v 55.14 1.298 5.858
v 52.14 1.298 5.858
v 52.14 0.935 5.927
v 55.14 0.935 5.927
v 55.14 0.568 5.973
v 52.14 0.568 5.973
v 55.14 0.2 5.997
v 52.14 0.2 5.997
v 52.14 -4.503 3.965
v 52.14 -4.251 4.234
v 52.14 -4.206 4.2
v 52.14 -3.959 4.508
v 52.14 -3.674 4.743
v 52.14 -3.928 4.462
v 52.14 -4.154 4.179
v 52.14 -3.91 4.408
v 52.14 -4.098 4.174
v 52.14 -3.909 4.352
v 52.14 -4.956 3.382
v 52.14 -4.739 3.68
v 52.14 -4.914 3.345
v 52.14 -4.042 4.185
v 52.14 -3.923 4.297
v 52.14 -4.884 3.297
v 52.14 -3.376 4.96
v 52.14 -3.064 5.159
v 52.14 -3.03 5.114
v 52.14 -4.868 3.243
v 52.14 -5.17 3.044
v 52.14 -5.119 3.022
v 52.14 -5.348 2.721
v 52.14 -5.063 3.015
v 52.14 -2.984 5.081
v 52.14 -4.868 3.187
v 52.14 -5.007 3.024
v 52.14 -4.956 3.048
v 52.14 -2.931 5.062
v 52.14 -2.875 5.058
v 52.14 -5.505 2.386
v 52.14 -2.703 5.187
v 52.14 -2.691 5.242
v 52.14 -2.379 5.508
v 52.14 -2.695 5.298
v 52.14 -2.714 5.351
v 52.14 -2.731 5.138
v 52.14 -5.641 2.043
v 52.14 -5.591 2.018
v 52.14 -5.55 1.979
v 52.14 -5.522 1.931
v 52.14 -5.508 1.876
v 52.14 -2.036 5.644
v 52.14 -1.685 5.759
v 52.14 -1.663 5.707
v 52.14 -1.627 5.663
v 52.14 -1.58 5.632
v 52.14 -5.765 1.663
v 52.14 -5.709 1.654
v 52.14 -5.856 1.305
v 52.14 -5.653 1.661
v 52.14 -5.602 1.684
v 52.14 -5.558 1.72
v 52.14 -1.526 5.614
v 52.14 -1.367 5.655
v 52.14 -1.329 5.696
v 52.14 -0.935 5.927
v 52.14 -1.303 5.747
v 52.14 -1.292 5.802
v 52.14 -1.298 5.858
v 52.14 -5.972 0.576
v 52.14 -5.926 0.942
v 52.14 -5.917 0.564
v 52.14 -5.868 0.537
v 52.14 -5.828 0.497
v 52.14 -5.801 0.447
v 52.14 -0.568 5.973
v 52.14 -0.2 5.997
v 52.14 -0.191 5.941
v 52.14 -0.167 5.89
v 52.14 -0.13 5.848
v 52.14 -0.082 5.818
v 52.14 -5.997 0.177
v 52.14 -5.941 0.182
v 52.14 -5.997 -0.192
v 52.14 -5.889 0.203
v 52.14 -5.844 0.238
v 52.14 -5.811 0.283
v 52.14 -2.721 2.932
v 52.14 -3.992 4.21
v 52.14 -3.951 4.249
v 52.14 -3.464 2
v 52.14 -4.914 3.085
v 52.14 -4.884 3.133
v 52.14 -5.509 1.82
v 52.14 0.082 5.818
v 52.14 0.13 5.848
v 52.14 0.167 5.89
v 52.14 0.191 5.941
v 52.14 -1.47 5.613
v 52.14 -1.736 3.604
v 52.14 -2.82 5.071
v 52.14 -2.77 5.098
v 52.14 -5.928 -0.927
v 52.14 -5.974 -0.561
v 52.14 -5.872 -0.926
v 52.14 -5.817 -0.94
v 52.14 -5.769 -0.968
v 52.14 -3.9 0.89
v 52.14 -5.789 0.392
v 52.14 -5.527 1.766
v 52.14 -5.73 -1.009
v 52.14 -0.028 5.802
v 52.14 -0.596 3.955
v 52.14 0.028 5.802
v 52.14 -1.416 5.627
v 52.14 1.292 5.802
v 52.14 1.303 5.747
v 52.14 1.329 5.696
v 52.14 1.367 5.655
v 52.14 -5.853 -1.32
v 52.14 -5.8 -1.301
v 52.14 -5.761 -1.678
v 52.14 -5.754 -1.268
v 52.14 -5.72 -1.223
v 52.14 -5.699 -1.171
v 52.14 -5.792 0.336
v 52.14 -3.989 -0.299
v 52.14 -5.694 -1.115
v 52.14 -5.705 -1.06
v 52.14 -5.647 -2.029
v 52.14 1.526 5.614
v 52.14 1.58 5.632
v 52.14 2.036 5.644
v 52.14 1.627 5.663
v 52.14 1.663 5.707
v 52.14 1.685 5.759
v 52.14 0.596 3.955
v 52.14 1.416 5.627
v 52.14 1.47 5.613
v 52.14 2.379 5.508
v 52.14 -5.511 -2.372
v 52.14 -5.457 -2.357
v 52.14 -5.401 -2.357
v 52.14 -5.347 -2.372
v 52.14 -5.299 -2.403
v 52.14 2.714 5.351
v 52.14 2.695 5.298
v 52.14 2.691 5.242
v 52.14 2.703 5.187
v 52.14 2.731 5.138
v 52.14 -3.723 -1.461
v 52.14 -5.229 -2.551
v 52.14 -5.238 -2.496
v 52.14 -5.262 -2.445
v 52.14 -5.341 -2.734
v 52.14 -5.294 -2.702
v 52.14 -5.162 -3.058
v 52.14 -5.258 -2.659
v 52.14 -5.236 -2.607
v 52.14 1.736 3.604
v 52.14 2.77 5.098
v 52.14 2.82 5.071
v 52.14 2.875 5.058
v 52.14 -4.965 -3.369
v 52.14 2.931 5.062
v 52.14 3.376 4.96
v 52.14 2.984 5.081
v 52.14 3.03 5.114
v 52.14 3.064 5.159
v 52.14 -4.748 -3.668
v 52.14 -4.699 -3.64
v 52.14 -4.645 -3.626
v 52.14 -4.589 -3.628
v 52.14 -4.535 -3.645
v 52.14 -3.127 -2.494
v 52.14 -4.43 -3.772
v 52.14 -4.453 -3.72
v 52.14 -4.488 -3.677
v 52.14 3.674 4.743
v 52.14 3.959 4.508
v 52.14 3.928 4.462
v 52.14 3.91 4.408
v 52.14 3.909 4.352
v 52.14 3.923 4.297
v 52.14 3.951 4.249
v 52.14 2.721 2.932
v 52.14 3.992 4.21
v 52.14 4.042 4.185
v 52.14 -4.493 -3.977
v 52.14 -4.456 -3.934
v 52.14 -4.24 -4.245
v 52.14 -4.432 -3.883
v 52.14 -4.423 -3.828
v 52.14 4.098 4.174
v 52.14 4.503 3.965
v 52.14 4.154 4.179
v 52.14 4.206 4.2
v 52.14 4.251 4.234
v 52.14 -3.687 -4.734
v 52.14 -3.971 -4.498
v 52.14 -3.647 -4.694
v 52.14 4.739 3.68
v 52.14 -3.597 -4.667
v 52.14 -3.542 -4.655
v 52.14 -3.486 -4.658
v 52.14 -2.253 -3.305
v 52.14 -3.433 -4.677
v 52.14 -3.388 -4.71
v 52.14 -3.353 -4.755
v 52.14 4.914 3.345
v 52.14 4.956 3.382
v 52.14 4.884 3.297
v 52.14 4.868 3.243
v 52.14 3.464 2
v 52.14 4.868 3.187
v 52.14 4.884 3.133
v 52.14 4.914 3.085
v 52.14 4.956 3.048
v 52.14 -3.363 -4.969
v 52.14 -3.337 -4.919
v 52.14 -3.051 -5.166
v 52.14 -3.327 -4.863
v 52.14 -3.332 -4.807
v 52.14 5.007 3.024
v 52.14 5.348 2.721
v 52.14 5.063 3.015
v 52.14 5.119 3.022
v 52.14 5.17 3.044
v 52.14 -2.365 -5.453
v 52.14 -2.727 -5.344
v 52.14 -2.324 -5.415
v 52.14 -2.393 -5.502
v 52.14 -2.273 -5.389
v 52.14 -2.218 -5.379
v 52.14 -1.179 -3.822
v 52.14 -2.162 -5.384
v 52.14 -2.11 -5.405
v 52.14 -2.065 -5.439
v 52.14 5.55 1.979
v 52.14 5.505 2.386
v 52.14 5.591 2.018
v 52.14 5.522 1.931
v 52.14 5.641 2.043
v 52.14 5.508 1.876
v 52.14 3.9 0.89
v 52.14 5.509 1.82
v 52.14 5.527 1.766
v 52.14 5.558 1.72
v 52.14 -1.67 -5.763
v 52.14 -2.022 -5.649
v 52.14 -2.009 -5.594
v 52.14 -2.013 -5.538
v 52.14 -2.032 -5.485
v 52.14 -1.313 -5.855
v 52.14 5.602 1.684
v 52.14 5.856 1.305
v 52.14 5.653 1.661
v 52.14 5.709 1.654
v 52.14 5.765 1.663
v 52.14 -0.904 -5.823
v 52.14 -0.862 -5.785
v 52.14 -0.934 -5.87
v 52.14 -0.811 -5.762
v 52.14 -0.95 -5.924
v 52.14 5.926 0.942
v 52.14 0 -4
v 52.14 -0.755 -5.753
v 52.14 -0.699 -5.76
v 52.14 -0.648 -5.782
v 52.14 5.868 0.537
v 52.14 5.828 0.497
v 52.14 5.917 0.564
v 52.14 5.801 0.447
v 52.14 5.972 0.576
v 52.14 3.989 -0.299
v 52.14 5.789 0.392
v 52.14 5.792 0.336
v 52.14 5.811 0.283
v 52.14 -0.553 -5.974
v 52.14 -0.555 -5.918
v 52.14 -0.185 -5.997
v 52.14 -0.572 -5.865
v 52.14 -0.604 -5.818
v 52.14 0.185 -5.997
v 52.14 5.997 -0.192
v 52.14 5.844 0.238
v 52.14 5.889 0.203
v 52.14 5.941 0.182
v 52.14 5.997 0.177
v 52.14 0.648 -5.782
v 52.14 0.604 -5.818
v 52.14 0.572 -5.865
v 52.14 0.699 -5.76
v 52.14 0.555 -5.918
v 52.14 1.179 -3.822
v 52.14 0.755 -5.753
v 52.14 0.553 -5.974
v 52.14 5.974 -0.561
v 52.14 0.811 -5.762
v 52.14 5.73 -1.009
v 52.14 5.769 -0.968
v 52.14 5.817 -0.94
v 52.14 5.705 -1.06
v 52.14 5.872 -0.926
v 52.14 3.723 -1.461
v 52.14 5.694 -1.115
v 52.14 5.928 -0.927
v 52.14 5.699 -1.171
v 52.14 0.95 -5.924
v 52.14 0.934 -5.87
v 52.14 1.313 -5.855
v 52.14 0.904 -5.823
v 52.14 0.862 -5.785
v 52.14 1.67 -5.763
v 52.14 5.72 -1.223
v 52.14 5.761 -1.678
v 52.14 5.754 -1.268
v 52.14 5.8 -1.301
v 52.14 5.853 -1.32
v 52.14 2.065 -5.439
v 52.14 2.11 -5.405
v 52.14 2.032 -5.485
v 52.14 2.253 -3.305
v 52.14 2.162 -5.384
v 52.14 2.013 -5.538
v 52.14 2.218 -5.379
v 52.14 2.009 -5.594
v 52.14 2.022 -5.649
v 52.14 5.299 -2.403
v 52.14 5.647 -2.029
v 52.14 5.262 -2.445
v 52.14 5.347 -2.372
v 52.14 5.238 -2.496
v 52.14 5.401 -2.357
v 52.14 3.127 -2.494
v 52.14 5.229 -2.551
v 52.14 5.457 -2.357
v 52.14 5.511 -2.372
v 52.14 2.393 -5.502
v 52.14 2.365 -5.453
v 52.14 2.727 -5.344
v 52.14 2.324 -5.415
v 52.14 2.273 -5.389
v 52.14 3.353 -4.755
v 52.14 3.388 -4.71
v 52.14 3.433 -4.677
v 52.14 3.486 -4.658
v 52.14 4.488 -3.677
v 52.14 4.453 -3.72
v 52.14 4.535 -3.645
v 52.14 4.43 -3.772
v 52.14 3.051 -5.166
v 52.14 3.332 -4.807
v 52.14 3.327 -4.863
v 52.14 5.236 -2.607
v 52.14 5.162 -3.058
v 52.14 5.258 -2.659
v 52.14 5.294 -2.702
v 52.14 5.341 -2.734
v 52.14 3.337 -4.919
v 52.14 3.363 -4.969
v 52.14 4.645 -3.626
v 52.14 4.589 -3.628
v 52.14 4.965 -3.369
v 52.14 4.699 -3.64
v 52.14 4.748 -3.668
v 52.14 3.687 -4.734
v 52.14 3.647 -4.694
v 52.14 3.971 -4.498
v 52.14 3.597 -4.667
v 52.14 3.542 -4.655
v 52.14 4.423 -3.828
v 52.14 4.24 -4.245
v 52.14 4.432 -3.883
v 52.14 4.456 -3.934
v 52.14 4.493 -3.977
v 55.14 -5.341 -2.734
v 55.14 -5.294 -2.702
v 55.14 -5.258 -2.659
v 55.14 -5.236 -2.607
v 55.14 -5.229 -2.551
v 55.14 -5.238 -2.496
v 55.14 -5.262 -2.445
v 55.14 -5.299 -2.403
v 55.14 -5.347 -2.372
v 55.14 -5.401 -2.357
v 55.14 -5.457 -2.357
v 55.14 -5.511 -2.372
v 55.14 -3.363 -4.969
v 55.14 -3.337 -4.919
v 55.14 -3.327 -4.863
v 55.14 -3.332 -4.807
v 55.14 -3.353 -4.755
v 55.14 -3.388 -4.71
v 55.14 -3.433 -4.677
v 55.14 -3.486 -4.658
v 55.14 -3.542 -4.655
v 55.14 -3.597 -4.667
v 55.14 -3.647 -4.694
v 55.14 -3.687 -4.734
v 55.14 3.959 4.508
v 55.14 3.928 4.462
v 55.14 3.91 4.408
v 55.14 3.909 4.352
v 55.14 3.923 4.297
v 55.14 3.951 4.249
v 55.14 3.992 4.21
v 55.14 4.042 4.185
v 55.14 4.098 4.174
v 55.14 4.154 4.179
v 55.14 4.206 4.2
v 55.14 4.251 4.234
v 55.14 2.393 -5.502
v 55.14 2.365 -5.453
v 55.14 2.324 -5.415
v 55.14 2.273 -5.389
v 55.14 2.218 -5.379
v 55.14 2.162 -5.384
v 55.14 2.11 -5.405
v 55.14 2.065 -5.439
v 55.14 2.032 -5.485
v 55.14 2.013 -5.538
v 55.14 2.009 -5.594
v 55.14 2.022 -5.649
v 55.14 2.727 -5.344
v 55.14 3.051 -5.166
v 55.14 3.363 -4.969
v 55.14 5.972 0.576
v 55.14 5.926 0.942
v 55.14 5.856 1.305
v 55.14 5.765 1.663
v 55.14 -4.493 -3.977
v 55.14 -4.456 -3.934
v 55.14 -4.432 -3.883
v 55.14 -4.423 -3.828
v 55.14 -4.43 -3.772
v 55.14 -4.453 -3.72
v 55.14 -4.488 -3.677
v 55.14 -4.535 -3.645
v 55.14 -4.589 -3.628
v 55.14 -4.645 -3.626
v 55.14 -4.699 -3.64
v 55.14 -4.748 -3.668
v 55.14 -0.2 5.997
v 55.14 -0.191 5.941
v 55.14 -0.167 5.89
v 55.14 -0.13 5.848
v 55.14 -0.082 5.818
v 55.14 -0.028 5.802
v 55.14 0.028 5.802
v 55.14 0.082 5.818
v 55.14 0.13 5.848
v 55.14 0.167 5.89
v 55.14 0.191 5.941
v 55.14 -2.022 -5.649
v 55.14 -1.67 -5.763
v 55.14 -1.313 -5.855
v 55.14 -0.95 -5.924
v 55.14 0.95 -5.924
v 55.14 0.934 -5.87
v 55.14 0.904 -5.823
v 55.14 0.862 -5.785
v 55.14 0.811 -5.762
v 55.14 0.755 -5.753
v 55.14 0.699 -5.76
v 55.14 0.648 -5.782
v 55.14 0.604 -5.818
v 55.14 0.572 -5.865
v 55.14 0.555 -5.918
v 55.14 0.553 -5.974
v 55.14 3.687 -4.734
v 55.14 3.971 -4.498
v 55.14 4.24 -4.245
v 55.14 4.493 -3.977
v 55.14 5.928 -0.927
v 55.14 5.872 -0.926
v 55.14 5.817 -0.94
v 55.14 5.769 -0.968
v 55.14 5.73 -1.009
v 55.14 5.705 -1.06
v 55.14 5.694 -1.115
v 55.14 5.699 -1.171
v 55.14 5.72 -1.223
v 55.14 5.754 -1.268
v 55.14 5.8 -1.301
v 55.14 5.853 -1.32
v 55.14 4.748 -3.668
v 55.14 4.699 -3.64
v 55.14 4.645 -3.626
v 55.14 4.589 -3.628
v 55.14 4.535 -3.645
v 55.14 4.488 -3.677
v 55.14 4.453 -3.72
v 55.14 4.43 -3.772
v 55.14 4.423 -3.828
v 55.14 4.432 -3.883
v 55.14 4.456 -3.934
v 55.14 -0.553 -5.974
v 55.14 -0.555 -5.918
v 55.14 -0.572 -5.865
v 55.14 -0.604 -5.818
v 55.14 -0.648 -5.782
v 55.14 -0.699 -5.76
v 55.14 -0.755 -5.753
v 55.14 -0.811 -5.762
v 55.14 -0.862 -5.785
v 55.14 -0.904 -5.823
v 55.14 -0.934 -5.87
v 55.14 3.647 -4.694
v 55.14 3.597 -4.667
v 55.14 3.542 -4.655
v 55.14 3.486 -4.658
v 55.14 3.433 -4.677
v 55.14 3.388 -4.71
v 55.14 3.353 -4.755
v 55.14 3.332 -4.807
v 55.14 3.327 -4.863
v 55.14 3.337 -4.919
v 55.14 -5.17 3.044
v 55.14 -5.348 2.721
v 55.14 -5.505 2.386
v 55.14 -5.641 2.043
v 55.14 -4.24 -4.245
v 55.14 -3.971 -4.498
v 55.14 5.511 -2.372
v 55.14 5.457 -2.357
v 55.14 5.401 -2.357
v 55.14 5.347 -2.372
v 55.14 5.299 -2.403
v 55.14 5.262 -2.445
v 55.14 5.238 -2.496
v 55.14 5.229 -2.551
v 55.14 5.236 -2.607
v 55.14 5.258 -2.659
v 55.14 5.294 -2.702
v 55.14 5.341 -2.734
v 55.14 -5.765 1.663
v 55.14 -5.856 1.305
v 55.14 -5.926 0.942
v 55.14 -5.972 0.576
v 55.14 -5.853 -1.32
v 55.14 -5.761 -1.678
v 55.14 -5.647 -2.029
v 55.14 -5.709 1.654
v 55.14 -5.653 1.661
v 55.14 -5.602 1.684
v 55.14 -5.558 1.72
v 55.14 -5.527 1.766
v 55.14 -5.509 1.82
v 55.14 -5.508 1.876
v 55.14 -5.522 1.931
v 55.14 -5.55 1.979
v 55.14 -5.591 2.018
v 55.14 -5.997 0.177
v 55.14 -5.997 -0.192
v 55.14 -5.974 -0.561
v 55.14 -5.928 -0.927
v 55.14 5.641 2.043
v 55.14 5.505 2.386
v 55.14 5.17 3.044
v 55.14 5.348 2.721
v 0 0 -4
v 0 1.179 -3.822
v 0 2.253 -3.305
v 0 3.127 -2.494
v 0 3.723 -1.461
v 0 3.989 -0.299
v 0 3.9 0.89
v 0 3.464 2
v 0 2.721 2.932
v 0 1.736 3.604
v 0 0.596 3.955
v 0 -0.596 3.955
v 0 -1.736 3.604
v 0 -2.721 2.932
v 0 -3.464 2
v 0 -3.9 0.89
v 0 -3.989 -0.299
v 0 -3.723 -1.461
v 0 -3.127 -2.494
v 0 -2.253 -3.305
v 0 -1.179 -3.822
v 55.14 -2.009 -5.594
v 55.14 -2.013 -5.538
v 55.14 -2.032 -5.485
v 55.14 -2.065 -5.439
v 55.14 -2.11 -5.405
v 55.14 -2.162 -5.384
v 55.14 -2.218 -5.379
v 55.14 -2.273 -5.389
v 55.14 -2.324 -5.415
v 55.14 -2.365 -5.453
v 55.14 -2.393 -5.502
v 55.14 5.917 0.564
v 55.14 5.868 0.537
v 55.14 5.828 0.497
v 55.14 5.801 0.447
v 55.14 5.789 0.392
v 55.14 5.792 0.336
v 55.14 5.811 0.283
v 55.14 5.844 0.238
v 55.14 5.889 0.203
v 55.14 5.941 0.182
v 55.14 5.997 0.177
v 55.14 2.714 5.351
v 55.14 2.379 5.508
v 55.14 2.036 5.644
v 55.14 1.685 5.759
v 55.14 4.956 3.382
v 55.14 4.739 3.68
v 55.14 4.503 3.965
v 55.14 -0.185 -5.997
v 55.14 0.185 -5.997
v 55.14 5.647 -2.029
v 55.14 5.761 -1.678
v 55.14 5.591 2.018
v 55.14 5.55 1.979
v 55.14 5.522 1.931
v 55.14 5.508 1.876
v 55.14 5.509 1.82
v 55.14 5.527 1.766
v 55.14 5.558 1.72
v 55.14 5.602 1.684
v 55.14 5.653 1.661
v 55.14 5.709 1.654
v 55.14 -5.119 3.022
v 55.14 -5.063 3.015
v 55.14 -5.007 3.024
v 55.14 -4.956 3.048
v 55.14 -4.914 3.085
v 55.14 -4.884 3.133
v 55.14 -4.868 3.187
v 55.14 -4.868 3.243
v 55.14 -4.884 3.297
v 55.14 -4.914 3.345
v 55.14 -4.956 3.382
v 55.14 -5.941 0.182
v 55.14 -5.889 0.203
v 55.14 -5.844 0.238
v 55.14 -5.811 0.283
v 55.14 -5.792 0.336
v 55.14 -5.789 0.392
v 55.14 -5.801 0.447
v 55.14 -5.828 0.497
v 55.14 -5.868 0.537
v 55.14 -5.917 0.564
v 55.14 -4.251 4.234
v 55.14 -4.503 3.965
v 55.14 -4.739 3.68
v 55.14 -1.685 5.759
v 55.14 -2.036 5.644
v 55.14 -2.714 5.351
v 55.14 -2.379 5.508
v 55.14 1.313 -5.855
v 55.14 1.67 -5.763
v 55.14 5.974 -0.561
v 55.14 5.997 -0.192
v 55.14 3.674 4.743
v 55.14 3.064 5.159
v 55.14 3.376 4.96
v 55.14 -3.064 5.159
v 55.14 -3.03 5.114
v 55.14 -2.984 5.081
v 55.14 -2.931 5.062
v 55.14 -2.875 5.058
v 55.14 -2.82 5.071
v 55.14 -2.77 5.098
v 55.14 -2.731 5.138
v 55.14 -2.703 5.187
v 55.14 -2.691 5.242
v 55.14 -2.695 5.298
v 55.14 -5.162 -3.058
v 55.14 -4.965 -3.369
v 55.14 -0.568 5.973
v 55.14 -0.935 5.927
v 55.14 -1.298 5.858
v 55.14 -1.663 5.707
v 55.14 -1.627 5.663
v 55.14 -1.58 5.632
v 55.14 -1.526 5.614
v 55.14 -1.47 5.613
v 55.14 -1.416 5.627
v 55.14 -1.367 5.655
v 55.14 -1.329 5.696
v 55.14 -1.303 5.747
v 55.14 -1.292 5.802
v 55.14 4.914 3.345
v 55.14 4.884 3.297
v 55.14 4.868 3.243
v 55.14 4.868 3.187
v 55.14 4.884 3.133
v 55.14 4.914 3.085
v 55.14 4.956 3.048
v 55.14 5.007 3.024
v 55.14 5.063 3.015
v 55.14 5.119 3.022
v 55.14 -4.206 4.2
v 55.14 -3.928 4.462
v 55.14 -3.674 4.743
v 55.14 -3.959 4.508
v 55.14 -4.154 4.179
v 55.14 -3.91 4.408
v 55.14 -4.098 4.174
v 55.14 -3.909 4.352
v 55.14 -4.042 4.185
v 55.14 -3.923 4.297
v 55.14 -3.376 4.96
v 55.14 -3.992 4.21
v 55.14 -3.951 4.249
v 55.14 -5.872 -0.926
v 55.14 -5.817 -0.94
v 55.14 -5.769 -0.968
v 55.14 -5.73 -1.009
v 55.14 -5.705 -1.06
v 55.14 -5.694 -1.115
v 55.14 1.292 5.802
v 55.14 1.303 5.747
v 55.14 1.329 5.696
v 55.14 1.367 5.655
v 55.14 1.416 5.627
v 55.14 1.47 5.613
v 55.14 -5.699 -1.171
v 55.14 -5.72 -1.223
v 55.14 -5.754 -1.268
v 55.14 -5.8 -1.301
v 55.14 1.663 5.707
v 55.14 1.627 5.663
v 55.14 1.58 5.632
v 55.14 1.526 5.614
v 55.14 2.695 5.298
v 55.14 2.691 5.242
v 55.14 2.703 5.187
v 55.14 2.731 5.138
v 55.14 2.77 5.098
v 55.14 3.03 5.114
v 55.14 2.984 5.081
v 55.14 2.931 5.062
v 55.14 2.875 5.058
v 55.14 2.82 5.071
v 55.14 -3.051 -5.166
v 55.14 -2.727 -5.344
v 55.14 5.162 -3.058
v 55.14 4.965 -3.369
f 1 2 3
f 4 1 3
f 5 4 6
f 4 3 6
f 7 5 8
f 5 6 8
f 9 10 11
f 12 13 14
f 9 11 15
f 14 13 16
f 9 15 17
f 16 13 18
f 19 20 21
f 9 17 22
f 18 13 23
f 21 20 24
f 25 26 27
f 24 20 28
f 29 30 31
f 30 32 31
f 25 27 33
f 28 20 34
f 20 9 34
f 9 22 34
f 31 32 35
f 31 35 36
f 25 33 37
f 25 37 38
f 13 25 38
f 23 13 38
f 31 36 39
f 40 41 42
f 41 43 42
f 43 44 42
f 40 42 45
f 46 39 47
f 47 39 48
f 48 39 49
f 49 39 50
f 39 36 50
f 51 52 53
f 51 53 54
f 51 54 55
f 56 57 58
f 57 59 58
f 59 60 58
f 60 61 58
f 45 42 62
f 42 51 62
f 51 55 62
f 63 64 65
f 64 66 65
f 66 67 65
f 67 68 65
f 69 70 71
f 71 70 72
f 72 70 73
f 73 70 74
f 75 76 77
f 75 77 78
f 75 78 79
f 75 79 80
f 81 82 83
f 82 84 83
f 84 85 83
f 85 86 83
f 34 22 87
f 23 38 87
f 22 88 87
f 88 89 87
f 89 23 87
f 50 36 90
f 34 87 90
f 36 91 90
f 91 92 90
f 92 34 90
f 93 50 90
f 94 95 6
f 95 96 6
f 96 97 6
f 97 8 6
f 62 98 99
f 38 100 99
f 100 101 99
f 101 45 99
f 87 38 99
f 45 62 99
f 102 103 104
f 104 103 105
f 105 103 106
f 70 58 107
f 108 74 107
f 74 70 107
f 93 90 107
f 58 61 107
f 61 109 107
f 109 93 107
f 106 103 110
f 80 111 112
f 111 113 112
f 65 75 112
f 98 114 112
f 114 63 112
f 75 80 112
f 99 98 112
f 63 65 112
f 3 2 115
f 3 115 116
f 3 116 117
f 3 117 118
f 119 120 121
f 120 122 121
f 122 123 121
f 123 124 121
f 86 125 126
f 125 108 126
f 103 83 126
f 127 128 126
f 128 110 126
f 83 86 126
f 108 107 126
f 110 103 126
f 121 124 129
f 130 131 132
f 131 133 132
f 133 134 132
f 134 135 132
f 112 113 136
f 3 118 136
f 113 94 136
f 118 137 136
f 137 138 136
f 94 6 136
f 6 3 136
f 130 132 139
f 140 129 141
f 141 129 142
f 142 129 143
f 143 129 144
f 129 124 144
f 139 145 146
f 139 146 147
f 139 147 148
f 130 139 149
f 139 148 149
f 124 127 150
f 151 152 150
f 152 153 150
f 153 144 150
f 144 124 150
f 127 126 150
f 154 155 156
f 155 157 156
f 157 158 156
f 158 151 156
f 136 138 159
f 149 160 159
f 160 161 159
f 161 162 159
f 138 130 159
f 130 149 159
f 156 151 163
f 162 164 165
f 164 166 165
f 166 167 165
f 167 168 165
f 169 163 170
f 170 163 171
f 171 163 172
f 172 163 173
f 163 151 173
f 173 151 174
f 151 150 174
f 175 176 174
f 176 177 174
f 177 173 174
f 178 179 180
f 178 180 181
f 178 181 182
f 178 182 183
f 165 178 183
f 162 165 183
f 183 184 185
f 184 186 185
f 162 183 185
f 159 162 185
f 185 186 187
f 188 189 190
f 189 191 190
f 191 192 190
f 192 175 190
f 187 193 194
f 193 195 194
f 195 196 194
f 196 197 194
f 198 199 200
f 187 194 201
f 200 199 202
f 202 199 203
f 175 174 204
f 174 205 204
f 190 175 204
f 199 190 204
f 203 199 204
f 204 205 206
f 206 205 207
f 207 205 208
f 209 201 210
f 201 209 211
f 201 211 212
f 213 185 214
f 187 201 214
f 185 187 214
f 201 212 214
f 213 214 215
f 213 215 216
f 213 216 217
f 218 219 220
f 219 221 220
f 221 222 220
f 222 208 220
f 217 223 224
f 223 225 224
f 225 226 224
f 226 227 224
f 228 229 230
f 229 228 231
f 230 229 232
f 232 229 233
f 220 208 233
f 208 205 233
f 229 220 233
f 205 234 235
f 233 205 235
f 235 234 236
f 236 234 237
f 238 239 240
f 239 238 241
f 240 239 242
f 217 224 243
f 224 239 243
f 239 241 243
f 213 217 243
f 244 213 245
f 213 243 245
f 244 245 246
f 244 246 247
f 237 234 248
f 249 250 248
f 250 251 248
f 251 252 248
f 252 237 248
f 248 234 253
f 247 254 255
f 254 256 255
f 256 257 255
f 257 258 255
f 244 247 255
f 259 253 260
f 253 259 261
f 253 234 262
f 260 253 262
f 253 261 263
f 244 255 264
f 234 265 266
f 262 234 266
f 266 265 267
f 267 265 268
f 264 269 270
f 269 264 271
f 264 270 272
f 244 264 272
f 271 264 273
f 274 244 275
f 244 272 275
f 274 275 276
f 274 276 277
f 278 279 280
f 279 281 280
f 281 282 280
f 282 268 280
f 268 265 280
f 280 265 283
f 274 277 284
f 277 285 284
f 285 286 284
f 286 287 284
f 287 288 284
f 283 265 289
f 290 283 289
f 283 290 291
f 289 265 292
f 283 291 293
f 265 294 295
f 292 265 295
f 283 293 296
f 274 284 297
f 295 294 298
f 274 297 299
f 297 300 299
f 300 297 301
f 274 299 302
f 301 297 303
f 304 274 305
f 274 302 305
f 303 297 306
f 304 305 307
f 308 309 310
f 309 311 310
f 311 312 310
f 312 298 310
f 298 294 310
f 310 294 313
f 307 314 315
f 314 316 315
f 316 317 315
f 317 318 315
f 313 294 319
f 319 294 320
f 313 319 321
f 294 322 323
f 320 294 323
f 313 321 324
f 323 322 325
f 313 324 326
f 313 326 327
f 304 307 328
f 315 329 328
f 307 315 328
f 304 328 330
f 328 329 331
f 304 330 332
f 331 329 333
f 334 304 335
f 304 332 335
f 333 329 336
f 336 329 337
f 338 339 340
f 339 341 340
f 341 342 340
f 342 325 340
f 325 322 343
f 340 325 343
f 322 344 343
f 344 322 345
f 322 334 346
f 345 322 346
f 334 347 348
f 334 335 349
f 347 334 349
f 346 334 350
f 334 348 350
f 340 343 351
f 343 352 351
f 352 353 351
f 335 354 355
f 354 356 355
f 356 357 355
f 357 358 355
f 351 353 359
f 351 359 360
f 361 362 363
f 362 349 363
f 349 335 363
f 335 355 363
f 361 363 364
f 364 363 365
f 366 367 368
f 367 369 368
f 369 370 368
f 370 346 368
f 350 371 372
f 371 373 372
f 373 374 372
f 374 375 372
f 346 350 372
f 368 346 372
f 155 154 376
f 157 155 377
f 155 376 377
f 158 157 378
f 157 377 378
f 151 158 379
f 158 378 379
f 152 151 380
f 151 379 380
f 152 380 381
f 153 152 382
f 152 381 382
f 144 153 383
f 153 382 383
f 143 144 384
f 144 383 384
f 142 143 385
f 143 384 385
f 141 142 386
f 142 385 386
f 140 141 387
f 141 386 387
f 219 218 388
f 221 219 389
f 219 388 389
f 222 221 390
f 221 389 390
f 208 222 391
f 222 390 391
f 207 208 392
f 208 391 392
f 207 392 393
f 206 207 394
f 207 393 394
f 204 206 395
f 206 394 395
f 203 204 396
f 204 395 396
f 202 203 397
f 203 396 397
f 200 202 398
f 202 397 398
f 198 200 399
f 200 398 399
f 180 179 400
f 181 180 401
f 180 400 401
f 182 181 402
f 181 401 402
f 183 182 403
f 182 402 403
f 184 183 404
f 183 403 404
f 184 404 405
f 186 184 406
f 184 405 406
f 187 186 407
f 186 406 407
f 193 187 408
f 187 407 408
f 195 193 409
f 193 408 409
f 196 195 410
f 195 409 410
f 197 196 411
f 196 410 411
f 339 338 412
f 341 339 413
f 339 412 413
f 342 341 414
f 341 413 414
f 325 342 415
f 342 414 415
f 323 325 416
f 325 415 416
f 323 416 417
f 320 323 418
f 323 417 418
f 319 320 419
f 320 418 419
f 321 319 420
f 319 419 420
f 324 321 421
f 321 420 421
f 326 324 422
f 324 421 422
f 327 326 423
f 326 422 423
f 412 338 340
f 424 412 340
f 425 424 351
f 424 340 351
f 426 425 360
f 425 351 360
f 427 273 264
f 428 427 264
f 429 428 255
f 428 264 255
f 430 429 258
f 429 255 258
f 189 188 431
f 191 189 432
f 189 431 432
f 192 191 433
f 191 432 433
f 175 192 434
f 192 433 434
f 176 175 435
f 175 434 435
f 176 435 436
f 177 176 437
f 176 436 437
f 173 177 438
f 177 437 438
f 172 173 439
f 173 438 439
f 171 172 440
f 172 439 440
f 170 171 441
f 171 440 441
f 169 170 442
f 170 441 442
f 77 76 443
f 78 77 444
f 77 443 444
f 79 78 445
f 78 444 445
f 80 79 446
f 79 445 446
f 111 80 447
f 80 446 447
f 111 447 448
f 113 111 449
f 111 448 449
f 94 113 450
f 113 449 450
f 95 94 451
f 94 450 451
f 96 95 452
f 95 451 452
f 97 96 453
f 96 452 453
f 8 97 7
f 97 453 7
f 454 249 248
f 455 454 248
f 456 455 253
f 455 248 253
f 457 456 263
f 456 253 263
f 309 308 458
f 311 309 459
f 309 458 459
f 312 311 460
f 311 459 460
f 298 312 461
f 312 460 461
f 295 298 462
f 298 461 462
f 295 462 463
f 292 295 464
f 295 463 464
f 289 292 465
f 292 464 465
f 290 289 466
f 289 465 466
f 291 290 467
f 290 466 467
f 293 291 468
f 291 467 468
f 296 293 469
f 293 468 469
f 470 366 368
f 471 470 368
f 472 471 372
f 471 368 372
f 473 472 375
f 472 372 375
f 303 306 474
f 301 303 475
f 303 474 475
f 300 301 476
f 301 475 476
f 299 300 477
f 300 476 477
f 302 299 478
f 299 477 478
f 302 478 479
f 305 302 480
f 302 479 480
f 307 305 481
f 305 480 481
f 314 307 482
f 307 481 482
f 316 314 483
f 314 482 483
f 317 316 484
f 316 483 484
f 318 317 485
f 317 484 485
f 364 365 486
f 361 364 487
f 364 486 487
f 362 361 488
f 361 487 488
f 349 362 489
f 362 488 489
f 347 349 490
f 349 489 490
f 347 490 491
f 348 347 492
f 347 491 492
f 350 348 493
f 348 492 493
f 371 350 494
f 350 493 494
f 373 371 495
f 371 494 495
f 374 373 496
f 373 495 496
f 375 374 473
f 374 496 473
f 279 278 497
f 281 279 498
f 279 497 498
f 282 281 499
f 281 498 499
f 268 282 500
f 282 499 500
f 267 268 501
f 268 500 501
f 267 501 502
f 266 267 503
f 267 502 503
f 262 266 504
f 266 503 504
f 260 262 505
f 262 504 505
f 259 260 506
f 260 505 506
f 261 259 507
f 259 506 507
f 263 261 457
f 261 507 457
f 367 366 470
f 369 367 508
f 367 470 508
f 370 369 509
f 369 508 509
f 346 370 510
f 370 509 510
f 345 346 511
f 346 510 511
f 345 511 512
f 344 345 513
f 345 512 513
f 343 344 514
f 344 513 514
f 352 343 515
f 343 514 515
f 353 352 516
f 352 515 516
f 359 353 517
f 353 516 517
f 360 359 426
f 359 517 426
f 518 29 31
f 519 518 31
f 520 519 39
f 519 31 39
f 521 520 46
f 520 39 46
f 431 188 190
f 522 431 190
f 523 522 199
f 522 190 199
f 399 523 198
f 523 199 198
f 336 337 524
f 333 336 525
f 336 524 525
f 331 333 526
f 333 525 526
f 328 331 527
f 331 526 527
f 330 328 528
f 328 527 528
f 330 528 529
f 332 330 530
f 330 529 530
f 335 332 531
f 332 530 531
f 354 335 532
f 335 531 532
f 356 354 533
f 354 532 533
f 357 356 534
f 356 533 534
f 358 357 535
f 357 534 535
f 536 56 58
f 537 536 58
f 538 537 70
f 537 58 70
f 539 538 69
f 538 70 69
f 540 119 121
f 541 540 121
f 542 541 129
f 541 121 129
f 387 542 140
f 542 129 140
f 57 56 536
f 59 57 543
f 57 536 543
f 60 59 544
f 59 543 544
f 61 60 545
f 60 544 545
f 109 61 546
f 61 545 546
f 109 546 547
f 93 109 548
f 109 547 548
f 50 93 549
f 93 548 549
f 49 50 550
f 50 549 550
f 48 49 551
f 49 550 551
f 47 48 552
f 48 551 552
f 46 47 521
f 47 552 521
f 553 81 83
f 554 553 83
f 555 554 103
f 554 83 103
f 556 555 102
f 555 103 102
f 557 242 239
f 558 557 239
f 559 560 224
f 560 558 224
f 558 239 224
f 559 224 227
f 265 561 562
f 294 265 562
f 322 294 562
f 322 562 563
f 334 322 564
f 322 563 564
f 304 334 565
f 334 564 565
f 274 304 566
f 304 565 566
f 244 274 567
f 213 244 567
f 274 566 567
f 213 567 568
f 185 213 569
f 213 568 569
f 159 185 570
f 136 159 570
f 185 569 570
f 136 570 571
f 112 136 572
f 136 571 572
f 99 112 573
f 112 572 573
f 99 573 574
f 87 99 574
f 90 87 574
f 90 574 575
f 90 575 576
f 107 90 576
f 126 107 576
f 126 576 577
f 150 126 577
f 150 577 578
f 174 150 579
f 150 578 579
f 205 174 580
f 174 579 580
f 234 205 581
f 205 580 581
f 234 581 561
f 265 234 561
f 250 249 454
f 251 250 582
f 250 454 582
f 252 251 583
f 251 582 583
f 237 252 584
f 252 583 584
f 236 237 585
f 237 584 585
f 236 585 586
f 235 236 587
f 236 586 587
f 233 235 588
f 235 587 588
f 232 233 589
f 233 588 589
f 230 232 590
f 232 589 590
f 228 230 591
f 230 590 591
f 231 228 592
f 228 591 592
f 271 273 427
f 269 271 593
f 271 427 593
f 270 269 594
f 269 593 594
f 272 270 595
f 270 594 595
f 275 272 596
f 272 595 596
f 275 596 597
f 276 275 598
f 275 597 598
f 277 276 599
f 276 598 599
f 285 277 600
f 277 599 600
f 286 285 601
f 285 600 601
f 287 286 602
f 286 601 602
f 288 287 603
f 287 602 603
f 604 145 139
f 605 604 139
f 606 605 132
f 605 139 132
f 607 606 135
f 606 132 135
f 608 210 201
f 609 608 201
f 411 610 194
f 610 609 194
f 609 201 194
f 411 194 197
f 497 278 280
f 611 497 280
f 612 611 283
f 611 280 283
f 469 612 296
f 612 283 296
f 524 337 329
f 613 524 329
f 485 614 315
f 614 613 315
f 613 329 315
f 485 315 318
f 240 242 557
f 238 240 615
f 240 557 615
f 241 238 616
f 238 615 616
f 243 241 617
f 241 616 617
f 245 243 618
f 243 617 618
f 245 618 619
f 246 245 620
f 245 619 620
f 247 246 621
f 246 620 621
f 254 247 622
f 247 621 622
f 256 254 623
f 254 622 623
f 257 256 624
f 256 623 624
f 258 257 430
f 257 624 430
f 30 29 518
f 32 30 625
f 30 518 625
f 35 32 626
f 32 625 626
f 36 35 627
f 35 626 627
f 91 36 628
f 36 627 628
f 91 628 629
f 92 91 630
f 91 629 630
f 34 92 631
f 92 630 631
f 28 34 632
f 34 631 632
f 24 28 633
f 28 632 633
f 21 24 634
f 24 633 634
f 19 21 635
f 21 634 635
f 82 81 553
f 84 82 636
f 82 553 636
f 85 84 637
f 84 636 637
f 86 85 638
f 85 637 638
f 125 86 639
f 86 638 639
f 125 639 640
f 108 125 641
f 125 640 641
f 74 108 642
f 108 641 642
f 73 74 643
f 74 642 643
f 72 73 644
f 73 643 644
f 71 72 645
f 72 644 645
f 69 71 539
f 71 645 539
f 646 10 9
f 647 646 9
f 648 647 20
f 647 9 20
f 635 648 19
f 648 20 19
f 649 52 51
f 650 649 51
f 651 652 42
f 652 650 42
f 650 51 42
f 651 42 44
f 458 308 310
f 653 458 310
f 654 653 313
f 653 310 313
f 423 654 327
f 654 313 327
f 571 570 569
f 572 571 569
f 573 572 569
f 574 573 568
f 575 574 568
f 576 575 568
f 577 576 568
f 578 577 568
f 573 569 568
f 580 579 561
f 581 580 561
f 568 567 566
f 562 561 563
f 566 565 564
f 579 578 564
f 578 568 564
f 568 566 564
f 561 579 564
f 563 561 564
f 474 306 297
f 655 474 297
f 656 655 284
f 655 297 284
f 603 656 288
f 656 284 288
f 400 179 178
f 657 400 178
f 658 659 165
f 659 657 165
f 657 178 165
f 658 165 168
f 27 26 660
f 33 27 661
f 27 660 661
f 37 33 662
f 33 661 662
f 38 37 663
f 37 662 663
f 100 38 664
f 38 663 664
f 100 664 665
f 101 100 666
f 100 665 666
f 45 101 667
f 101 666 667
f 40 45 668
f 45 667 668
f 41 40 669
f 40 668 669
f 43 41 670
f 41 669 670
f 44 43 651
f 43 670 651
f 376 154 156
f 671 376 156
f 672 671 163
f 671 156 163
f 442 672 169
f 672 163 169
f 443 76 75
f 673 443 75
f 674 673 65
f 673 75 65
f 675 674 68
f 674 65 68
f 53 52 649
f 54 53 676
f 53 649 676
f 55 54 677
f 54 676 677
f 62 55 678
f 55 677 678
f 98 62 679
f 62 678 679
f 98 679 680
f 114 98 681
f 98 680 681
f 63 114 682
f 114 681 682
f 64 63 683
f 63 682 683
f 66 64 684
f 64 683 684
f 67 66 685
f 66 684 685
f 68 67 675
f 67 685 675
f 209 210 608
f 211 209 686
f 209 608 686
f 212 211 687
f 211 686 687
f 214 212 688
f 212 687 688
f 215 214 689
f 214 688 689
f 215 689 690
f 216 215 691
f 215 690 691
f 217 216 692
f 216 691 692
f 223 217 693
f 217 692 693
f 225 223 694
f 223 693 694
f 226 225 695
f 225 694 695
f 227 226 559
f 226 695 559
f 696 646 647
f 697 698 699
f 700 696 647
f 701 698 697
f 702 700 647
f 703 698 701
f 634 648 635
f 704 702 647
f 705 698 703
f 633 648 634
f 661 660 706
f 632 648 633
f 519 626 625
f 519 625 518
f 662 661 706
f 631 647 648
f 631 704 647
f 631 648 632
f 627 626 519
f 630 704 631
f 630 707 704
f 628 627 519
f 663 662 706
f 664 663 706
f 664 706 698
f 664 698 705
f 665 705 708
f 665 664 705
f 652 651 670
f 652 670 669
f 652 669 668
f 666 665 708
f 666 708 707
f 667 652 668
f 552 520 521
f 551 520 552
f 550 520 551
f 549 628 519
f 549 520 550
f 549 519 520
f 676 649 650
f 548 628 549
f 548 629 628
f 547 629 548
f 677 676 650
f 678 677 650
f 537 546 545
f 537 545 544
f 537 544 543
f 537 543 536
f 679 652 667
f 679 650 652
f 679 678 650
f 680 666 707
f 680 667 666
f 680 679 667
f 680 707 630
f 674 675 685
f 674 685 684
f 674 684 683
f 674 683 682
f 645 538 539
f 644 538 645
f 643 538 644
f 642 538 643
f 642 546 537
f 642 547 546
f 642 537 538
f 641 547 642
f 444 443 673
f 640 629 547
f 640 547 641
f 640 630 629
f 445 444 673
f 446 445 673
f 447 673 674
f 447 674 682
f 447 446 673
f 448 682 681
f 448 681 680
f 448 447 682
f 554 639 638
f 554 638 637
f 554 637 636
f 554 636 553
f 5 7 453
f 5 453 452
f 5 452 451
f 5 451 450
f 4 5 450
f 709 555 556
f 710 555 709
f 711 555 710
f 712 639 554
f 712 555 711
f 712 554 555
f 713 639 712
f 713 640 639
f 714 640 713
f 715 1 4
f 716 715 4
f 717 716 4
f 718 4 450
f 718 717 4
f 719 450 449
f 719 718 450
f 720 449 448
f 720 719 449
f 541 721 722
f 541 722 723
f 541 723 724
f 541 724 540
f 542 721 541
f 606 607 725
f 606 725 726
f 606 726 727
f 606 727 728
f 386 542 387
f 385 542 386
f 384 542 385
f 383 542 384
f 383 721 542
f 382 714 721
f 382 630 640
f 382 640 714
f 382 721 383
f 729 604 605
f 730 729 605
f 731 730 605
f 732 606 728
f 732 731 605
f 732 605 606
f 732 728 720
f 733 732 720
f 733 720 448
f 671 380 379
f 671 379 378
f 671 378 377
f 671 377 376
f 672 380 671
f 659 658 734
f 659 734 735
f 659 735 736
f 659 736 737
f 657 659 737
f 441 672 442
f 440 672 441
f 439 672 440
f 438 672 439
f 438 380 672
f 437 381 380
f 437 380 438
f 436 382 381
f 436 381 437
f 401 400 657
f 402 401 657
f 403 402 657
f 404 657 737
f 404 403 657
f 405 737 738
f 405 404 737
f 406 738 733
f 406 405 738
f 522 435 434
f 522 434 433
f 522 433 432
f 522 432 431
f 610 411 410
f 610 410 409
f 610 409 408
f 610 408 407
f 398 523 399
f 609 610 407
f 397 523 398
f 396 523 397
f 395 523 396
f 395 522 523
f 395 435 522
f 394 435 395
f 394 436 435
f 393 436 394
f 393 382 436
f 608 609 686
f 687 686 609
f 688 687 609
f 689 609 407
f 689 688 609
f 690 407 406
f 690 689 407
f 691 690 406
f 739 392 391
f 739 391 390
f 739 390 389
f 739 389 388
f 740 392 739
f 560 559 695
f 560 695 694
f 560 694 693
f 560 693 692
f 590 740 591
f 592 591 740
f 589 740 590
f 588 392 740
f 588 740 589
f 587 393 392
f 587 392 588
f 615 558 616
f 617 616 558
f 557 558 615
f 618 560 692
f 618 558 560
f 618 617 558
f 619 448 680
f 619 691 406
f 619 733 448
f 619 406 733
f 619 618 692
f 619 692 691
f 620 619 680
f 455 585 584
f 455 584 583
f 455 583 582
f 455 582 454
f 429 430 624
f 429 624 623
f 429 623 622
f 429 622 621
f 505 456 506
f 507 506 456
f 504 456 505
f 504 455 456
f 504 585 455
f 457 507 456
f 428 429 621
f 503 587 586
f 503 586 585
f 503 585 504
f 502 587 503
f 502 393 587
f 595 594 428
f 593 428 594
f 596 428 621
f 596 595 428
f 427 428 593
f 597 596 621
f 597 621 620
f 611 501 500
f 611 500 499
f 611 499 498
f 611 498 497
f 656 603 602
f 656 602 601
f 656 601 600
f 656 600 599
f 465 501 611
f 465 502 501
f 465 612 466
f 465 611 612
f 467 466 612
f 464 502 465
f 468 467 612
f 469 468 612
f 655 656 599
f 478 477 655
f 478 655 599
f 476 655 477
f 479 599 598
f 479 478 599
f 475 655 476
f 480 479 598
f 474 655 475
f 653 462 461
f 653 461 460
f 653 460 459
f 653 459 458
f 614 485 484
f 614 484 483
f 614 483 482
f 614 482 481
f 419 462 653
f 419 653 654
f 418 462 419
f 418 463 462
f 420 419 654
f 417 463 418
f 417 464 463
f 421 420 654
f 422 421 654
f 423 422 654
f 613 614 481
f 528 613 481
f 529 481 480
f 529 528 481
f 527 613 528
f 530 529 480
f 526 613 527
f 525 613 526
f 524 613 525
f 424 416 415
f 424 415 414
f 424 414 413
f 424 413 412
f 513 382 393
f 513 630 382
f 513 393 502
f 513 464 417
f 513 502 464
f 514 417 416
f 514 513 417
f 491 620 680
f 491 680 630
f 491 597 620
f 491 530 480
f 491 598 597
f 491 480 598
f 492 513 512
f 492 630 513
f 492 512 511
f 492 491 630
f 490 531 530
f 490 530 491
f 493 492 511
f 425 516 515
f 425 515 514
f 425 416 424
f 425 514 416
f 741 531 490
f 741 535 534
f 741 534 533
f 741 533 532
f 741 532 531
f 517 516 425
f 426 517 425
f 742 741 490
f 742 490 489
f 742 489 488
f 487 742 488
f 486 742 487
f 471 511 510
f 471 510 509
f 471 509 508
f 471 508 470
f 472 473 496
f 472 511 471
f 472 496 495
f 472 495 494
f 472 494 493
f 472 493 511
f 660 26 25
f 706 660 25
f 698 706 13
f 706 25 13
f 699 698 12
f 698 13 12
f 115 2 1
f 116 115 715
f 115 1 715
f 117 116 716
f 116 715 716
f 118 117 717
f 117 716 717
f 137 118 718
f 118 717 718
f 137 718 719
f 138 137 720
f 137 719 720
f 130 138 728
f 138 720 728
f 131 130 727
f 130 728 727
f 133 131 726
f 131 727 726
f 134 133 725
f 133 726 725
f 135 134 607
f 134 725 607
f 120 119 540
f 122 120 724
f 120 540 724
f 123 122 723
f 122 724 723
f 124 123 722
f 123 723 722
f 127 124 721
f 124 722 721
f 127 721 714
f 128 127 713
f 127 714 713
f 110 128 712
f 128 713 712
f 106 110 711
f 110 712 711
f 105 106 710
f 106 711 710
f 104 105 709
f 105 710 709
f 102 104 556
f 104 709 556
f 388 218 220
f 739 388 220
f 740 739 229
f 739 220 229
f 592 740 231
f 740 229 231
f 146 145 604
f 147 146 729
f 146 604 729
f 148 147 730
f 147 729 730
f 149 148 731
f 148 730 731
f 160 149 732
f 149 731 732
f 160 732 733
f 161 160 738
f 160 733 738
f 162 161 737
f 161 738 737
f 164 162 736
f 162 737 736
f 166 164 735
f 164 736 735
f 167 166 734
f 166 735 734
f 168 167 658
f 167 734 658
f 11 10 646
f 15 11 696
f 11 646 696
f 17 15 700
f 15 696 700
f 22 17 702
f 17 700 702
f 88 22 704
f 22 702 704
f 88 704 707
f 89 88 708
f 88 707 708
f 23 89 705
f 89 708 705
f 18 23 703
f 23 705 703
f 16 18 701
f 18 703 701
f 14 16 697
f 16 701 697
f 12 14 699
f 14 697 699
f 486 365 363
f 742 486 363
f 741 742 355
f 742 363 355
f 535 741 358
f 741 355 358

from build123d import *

# Parameters (mm, degrees)
SKETCH1_R           = 4
BOSS_EXTRUDE1_DEPTH = 52.14
SKETCH2_R           = 6
BOSS_EXTRUDE2_DEPTH = 3
CUT_EXTRUDE1_REACH  = 57.789
SKETCH3_R           = 0.2
CIRPATTERN1_COUNT   = 25


with BuildPart() as part:
    # Sketch1 → Boss-Extrude1 (new body)
    with BuildSketch(Plane(origin=(0, 0, 0), x_dir=(0, 0, -1), z_dir=(1, 0, 0))):
        Circle(SKETCH1_R)
    extrude(amount=BOSS_EXTRUDE1_DEPTH)

    # Sketch2 → Boss-Extrude2 (add)
    with BuildSketch(Plane(origin=(52.14, 0, 0), x_dir=(0, 0, -1), z_dir=(1, 0, 0))):
        Circle(SKETCH2_R)
    extrude(amount=BOSS_EXTRUDE2_DEPTH)

    # Sketch3 → Cut-Extrude1 (cut, up to next)
    with BuildSketch(Plane(origin=(55.14, 0, 0), x_dir=(0, 0, -1), z_dir=(1, 0, 0)), mode=Mode.PRIVATE) as cut_extrude1_sk1:
        with Locations((-6, 0)):
            Circle(SKETCH3_R)
    cut_extrude1_tool1 = extrude(cut_extrude1_sk1.sketch, amount=-CUT_EXTRUDE1_REACH, mode=Mode.PRIVATE) & part.part
    cut_extrude1 = cut_extrude1_tool1.solids().sort_by_distance((55.14, 0, 6))[0]
    add(cut_extrude1, mode=Mode.SUBTRACT)

    # CirPattern1: Cut-Extrude1 ×25 about axis
    cirpattern1_axis = Axis((0, 0, 0), (1, 0, 0))
    for i in range(1, CIRPATTERN1_COUNT):
        add(cut_extrude1.rotate(cirpattern1_axis, i * 360 / CIRPATTERN1_COUNT), mode=Mode.SUBTRACT)


solid = part.part
